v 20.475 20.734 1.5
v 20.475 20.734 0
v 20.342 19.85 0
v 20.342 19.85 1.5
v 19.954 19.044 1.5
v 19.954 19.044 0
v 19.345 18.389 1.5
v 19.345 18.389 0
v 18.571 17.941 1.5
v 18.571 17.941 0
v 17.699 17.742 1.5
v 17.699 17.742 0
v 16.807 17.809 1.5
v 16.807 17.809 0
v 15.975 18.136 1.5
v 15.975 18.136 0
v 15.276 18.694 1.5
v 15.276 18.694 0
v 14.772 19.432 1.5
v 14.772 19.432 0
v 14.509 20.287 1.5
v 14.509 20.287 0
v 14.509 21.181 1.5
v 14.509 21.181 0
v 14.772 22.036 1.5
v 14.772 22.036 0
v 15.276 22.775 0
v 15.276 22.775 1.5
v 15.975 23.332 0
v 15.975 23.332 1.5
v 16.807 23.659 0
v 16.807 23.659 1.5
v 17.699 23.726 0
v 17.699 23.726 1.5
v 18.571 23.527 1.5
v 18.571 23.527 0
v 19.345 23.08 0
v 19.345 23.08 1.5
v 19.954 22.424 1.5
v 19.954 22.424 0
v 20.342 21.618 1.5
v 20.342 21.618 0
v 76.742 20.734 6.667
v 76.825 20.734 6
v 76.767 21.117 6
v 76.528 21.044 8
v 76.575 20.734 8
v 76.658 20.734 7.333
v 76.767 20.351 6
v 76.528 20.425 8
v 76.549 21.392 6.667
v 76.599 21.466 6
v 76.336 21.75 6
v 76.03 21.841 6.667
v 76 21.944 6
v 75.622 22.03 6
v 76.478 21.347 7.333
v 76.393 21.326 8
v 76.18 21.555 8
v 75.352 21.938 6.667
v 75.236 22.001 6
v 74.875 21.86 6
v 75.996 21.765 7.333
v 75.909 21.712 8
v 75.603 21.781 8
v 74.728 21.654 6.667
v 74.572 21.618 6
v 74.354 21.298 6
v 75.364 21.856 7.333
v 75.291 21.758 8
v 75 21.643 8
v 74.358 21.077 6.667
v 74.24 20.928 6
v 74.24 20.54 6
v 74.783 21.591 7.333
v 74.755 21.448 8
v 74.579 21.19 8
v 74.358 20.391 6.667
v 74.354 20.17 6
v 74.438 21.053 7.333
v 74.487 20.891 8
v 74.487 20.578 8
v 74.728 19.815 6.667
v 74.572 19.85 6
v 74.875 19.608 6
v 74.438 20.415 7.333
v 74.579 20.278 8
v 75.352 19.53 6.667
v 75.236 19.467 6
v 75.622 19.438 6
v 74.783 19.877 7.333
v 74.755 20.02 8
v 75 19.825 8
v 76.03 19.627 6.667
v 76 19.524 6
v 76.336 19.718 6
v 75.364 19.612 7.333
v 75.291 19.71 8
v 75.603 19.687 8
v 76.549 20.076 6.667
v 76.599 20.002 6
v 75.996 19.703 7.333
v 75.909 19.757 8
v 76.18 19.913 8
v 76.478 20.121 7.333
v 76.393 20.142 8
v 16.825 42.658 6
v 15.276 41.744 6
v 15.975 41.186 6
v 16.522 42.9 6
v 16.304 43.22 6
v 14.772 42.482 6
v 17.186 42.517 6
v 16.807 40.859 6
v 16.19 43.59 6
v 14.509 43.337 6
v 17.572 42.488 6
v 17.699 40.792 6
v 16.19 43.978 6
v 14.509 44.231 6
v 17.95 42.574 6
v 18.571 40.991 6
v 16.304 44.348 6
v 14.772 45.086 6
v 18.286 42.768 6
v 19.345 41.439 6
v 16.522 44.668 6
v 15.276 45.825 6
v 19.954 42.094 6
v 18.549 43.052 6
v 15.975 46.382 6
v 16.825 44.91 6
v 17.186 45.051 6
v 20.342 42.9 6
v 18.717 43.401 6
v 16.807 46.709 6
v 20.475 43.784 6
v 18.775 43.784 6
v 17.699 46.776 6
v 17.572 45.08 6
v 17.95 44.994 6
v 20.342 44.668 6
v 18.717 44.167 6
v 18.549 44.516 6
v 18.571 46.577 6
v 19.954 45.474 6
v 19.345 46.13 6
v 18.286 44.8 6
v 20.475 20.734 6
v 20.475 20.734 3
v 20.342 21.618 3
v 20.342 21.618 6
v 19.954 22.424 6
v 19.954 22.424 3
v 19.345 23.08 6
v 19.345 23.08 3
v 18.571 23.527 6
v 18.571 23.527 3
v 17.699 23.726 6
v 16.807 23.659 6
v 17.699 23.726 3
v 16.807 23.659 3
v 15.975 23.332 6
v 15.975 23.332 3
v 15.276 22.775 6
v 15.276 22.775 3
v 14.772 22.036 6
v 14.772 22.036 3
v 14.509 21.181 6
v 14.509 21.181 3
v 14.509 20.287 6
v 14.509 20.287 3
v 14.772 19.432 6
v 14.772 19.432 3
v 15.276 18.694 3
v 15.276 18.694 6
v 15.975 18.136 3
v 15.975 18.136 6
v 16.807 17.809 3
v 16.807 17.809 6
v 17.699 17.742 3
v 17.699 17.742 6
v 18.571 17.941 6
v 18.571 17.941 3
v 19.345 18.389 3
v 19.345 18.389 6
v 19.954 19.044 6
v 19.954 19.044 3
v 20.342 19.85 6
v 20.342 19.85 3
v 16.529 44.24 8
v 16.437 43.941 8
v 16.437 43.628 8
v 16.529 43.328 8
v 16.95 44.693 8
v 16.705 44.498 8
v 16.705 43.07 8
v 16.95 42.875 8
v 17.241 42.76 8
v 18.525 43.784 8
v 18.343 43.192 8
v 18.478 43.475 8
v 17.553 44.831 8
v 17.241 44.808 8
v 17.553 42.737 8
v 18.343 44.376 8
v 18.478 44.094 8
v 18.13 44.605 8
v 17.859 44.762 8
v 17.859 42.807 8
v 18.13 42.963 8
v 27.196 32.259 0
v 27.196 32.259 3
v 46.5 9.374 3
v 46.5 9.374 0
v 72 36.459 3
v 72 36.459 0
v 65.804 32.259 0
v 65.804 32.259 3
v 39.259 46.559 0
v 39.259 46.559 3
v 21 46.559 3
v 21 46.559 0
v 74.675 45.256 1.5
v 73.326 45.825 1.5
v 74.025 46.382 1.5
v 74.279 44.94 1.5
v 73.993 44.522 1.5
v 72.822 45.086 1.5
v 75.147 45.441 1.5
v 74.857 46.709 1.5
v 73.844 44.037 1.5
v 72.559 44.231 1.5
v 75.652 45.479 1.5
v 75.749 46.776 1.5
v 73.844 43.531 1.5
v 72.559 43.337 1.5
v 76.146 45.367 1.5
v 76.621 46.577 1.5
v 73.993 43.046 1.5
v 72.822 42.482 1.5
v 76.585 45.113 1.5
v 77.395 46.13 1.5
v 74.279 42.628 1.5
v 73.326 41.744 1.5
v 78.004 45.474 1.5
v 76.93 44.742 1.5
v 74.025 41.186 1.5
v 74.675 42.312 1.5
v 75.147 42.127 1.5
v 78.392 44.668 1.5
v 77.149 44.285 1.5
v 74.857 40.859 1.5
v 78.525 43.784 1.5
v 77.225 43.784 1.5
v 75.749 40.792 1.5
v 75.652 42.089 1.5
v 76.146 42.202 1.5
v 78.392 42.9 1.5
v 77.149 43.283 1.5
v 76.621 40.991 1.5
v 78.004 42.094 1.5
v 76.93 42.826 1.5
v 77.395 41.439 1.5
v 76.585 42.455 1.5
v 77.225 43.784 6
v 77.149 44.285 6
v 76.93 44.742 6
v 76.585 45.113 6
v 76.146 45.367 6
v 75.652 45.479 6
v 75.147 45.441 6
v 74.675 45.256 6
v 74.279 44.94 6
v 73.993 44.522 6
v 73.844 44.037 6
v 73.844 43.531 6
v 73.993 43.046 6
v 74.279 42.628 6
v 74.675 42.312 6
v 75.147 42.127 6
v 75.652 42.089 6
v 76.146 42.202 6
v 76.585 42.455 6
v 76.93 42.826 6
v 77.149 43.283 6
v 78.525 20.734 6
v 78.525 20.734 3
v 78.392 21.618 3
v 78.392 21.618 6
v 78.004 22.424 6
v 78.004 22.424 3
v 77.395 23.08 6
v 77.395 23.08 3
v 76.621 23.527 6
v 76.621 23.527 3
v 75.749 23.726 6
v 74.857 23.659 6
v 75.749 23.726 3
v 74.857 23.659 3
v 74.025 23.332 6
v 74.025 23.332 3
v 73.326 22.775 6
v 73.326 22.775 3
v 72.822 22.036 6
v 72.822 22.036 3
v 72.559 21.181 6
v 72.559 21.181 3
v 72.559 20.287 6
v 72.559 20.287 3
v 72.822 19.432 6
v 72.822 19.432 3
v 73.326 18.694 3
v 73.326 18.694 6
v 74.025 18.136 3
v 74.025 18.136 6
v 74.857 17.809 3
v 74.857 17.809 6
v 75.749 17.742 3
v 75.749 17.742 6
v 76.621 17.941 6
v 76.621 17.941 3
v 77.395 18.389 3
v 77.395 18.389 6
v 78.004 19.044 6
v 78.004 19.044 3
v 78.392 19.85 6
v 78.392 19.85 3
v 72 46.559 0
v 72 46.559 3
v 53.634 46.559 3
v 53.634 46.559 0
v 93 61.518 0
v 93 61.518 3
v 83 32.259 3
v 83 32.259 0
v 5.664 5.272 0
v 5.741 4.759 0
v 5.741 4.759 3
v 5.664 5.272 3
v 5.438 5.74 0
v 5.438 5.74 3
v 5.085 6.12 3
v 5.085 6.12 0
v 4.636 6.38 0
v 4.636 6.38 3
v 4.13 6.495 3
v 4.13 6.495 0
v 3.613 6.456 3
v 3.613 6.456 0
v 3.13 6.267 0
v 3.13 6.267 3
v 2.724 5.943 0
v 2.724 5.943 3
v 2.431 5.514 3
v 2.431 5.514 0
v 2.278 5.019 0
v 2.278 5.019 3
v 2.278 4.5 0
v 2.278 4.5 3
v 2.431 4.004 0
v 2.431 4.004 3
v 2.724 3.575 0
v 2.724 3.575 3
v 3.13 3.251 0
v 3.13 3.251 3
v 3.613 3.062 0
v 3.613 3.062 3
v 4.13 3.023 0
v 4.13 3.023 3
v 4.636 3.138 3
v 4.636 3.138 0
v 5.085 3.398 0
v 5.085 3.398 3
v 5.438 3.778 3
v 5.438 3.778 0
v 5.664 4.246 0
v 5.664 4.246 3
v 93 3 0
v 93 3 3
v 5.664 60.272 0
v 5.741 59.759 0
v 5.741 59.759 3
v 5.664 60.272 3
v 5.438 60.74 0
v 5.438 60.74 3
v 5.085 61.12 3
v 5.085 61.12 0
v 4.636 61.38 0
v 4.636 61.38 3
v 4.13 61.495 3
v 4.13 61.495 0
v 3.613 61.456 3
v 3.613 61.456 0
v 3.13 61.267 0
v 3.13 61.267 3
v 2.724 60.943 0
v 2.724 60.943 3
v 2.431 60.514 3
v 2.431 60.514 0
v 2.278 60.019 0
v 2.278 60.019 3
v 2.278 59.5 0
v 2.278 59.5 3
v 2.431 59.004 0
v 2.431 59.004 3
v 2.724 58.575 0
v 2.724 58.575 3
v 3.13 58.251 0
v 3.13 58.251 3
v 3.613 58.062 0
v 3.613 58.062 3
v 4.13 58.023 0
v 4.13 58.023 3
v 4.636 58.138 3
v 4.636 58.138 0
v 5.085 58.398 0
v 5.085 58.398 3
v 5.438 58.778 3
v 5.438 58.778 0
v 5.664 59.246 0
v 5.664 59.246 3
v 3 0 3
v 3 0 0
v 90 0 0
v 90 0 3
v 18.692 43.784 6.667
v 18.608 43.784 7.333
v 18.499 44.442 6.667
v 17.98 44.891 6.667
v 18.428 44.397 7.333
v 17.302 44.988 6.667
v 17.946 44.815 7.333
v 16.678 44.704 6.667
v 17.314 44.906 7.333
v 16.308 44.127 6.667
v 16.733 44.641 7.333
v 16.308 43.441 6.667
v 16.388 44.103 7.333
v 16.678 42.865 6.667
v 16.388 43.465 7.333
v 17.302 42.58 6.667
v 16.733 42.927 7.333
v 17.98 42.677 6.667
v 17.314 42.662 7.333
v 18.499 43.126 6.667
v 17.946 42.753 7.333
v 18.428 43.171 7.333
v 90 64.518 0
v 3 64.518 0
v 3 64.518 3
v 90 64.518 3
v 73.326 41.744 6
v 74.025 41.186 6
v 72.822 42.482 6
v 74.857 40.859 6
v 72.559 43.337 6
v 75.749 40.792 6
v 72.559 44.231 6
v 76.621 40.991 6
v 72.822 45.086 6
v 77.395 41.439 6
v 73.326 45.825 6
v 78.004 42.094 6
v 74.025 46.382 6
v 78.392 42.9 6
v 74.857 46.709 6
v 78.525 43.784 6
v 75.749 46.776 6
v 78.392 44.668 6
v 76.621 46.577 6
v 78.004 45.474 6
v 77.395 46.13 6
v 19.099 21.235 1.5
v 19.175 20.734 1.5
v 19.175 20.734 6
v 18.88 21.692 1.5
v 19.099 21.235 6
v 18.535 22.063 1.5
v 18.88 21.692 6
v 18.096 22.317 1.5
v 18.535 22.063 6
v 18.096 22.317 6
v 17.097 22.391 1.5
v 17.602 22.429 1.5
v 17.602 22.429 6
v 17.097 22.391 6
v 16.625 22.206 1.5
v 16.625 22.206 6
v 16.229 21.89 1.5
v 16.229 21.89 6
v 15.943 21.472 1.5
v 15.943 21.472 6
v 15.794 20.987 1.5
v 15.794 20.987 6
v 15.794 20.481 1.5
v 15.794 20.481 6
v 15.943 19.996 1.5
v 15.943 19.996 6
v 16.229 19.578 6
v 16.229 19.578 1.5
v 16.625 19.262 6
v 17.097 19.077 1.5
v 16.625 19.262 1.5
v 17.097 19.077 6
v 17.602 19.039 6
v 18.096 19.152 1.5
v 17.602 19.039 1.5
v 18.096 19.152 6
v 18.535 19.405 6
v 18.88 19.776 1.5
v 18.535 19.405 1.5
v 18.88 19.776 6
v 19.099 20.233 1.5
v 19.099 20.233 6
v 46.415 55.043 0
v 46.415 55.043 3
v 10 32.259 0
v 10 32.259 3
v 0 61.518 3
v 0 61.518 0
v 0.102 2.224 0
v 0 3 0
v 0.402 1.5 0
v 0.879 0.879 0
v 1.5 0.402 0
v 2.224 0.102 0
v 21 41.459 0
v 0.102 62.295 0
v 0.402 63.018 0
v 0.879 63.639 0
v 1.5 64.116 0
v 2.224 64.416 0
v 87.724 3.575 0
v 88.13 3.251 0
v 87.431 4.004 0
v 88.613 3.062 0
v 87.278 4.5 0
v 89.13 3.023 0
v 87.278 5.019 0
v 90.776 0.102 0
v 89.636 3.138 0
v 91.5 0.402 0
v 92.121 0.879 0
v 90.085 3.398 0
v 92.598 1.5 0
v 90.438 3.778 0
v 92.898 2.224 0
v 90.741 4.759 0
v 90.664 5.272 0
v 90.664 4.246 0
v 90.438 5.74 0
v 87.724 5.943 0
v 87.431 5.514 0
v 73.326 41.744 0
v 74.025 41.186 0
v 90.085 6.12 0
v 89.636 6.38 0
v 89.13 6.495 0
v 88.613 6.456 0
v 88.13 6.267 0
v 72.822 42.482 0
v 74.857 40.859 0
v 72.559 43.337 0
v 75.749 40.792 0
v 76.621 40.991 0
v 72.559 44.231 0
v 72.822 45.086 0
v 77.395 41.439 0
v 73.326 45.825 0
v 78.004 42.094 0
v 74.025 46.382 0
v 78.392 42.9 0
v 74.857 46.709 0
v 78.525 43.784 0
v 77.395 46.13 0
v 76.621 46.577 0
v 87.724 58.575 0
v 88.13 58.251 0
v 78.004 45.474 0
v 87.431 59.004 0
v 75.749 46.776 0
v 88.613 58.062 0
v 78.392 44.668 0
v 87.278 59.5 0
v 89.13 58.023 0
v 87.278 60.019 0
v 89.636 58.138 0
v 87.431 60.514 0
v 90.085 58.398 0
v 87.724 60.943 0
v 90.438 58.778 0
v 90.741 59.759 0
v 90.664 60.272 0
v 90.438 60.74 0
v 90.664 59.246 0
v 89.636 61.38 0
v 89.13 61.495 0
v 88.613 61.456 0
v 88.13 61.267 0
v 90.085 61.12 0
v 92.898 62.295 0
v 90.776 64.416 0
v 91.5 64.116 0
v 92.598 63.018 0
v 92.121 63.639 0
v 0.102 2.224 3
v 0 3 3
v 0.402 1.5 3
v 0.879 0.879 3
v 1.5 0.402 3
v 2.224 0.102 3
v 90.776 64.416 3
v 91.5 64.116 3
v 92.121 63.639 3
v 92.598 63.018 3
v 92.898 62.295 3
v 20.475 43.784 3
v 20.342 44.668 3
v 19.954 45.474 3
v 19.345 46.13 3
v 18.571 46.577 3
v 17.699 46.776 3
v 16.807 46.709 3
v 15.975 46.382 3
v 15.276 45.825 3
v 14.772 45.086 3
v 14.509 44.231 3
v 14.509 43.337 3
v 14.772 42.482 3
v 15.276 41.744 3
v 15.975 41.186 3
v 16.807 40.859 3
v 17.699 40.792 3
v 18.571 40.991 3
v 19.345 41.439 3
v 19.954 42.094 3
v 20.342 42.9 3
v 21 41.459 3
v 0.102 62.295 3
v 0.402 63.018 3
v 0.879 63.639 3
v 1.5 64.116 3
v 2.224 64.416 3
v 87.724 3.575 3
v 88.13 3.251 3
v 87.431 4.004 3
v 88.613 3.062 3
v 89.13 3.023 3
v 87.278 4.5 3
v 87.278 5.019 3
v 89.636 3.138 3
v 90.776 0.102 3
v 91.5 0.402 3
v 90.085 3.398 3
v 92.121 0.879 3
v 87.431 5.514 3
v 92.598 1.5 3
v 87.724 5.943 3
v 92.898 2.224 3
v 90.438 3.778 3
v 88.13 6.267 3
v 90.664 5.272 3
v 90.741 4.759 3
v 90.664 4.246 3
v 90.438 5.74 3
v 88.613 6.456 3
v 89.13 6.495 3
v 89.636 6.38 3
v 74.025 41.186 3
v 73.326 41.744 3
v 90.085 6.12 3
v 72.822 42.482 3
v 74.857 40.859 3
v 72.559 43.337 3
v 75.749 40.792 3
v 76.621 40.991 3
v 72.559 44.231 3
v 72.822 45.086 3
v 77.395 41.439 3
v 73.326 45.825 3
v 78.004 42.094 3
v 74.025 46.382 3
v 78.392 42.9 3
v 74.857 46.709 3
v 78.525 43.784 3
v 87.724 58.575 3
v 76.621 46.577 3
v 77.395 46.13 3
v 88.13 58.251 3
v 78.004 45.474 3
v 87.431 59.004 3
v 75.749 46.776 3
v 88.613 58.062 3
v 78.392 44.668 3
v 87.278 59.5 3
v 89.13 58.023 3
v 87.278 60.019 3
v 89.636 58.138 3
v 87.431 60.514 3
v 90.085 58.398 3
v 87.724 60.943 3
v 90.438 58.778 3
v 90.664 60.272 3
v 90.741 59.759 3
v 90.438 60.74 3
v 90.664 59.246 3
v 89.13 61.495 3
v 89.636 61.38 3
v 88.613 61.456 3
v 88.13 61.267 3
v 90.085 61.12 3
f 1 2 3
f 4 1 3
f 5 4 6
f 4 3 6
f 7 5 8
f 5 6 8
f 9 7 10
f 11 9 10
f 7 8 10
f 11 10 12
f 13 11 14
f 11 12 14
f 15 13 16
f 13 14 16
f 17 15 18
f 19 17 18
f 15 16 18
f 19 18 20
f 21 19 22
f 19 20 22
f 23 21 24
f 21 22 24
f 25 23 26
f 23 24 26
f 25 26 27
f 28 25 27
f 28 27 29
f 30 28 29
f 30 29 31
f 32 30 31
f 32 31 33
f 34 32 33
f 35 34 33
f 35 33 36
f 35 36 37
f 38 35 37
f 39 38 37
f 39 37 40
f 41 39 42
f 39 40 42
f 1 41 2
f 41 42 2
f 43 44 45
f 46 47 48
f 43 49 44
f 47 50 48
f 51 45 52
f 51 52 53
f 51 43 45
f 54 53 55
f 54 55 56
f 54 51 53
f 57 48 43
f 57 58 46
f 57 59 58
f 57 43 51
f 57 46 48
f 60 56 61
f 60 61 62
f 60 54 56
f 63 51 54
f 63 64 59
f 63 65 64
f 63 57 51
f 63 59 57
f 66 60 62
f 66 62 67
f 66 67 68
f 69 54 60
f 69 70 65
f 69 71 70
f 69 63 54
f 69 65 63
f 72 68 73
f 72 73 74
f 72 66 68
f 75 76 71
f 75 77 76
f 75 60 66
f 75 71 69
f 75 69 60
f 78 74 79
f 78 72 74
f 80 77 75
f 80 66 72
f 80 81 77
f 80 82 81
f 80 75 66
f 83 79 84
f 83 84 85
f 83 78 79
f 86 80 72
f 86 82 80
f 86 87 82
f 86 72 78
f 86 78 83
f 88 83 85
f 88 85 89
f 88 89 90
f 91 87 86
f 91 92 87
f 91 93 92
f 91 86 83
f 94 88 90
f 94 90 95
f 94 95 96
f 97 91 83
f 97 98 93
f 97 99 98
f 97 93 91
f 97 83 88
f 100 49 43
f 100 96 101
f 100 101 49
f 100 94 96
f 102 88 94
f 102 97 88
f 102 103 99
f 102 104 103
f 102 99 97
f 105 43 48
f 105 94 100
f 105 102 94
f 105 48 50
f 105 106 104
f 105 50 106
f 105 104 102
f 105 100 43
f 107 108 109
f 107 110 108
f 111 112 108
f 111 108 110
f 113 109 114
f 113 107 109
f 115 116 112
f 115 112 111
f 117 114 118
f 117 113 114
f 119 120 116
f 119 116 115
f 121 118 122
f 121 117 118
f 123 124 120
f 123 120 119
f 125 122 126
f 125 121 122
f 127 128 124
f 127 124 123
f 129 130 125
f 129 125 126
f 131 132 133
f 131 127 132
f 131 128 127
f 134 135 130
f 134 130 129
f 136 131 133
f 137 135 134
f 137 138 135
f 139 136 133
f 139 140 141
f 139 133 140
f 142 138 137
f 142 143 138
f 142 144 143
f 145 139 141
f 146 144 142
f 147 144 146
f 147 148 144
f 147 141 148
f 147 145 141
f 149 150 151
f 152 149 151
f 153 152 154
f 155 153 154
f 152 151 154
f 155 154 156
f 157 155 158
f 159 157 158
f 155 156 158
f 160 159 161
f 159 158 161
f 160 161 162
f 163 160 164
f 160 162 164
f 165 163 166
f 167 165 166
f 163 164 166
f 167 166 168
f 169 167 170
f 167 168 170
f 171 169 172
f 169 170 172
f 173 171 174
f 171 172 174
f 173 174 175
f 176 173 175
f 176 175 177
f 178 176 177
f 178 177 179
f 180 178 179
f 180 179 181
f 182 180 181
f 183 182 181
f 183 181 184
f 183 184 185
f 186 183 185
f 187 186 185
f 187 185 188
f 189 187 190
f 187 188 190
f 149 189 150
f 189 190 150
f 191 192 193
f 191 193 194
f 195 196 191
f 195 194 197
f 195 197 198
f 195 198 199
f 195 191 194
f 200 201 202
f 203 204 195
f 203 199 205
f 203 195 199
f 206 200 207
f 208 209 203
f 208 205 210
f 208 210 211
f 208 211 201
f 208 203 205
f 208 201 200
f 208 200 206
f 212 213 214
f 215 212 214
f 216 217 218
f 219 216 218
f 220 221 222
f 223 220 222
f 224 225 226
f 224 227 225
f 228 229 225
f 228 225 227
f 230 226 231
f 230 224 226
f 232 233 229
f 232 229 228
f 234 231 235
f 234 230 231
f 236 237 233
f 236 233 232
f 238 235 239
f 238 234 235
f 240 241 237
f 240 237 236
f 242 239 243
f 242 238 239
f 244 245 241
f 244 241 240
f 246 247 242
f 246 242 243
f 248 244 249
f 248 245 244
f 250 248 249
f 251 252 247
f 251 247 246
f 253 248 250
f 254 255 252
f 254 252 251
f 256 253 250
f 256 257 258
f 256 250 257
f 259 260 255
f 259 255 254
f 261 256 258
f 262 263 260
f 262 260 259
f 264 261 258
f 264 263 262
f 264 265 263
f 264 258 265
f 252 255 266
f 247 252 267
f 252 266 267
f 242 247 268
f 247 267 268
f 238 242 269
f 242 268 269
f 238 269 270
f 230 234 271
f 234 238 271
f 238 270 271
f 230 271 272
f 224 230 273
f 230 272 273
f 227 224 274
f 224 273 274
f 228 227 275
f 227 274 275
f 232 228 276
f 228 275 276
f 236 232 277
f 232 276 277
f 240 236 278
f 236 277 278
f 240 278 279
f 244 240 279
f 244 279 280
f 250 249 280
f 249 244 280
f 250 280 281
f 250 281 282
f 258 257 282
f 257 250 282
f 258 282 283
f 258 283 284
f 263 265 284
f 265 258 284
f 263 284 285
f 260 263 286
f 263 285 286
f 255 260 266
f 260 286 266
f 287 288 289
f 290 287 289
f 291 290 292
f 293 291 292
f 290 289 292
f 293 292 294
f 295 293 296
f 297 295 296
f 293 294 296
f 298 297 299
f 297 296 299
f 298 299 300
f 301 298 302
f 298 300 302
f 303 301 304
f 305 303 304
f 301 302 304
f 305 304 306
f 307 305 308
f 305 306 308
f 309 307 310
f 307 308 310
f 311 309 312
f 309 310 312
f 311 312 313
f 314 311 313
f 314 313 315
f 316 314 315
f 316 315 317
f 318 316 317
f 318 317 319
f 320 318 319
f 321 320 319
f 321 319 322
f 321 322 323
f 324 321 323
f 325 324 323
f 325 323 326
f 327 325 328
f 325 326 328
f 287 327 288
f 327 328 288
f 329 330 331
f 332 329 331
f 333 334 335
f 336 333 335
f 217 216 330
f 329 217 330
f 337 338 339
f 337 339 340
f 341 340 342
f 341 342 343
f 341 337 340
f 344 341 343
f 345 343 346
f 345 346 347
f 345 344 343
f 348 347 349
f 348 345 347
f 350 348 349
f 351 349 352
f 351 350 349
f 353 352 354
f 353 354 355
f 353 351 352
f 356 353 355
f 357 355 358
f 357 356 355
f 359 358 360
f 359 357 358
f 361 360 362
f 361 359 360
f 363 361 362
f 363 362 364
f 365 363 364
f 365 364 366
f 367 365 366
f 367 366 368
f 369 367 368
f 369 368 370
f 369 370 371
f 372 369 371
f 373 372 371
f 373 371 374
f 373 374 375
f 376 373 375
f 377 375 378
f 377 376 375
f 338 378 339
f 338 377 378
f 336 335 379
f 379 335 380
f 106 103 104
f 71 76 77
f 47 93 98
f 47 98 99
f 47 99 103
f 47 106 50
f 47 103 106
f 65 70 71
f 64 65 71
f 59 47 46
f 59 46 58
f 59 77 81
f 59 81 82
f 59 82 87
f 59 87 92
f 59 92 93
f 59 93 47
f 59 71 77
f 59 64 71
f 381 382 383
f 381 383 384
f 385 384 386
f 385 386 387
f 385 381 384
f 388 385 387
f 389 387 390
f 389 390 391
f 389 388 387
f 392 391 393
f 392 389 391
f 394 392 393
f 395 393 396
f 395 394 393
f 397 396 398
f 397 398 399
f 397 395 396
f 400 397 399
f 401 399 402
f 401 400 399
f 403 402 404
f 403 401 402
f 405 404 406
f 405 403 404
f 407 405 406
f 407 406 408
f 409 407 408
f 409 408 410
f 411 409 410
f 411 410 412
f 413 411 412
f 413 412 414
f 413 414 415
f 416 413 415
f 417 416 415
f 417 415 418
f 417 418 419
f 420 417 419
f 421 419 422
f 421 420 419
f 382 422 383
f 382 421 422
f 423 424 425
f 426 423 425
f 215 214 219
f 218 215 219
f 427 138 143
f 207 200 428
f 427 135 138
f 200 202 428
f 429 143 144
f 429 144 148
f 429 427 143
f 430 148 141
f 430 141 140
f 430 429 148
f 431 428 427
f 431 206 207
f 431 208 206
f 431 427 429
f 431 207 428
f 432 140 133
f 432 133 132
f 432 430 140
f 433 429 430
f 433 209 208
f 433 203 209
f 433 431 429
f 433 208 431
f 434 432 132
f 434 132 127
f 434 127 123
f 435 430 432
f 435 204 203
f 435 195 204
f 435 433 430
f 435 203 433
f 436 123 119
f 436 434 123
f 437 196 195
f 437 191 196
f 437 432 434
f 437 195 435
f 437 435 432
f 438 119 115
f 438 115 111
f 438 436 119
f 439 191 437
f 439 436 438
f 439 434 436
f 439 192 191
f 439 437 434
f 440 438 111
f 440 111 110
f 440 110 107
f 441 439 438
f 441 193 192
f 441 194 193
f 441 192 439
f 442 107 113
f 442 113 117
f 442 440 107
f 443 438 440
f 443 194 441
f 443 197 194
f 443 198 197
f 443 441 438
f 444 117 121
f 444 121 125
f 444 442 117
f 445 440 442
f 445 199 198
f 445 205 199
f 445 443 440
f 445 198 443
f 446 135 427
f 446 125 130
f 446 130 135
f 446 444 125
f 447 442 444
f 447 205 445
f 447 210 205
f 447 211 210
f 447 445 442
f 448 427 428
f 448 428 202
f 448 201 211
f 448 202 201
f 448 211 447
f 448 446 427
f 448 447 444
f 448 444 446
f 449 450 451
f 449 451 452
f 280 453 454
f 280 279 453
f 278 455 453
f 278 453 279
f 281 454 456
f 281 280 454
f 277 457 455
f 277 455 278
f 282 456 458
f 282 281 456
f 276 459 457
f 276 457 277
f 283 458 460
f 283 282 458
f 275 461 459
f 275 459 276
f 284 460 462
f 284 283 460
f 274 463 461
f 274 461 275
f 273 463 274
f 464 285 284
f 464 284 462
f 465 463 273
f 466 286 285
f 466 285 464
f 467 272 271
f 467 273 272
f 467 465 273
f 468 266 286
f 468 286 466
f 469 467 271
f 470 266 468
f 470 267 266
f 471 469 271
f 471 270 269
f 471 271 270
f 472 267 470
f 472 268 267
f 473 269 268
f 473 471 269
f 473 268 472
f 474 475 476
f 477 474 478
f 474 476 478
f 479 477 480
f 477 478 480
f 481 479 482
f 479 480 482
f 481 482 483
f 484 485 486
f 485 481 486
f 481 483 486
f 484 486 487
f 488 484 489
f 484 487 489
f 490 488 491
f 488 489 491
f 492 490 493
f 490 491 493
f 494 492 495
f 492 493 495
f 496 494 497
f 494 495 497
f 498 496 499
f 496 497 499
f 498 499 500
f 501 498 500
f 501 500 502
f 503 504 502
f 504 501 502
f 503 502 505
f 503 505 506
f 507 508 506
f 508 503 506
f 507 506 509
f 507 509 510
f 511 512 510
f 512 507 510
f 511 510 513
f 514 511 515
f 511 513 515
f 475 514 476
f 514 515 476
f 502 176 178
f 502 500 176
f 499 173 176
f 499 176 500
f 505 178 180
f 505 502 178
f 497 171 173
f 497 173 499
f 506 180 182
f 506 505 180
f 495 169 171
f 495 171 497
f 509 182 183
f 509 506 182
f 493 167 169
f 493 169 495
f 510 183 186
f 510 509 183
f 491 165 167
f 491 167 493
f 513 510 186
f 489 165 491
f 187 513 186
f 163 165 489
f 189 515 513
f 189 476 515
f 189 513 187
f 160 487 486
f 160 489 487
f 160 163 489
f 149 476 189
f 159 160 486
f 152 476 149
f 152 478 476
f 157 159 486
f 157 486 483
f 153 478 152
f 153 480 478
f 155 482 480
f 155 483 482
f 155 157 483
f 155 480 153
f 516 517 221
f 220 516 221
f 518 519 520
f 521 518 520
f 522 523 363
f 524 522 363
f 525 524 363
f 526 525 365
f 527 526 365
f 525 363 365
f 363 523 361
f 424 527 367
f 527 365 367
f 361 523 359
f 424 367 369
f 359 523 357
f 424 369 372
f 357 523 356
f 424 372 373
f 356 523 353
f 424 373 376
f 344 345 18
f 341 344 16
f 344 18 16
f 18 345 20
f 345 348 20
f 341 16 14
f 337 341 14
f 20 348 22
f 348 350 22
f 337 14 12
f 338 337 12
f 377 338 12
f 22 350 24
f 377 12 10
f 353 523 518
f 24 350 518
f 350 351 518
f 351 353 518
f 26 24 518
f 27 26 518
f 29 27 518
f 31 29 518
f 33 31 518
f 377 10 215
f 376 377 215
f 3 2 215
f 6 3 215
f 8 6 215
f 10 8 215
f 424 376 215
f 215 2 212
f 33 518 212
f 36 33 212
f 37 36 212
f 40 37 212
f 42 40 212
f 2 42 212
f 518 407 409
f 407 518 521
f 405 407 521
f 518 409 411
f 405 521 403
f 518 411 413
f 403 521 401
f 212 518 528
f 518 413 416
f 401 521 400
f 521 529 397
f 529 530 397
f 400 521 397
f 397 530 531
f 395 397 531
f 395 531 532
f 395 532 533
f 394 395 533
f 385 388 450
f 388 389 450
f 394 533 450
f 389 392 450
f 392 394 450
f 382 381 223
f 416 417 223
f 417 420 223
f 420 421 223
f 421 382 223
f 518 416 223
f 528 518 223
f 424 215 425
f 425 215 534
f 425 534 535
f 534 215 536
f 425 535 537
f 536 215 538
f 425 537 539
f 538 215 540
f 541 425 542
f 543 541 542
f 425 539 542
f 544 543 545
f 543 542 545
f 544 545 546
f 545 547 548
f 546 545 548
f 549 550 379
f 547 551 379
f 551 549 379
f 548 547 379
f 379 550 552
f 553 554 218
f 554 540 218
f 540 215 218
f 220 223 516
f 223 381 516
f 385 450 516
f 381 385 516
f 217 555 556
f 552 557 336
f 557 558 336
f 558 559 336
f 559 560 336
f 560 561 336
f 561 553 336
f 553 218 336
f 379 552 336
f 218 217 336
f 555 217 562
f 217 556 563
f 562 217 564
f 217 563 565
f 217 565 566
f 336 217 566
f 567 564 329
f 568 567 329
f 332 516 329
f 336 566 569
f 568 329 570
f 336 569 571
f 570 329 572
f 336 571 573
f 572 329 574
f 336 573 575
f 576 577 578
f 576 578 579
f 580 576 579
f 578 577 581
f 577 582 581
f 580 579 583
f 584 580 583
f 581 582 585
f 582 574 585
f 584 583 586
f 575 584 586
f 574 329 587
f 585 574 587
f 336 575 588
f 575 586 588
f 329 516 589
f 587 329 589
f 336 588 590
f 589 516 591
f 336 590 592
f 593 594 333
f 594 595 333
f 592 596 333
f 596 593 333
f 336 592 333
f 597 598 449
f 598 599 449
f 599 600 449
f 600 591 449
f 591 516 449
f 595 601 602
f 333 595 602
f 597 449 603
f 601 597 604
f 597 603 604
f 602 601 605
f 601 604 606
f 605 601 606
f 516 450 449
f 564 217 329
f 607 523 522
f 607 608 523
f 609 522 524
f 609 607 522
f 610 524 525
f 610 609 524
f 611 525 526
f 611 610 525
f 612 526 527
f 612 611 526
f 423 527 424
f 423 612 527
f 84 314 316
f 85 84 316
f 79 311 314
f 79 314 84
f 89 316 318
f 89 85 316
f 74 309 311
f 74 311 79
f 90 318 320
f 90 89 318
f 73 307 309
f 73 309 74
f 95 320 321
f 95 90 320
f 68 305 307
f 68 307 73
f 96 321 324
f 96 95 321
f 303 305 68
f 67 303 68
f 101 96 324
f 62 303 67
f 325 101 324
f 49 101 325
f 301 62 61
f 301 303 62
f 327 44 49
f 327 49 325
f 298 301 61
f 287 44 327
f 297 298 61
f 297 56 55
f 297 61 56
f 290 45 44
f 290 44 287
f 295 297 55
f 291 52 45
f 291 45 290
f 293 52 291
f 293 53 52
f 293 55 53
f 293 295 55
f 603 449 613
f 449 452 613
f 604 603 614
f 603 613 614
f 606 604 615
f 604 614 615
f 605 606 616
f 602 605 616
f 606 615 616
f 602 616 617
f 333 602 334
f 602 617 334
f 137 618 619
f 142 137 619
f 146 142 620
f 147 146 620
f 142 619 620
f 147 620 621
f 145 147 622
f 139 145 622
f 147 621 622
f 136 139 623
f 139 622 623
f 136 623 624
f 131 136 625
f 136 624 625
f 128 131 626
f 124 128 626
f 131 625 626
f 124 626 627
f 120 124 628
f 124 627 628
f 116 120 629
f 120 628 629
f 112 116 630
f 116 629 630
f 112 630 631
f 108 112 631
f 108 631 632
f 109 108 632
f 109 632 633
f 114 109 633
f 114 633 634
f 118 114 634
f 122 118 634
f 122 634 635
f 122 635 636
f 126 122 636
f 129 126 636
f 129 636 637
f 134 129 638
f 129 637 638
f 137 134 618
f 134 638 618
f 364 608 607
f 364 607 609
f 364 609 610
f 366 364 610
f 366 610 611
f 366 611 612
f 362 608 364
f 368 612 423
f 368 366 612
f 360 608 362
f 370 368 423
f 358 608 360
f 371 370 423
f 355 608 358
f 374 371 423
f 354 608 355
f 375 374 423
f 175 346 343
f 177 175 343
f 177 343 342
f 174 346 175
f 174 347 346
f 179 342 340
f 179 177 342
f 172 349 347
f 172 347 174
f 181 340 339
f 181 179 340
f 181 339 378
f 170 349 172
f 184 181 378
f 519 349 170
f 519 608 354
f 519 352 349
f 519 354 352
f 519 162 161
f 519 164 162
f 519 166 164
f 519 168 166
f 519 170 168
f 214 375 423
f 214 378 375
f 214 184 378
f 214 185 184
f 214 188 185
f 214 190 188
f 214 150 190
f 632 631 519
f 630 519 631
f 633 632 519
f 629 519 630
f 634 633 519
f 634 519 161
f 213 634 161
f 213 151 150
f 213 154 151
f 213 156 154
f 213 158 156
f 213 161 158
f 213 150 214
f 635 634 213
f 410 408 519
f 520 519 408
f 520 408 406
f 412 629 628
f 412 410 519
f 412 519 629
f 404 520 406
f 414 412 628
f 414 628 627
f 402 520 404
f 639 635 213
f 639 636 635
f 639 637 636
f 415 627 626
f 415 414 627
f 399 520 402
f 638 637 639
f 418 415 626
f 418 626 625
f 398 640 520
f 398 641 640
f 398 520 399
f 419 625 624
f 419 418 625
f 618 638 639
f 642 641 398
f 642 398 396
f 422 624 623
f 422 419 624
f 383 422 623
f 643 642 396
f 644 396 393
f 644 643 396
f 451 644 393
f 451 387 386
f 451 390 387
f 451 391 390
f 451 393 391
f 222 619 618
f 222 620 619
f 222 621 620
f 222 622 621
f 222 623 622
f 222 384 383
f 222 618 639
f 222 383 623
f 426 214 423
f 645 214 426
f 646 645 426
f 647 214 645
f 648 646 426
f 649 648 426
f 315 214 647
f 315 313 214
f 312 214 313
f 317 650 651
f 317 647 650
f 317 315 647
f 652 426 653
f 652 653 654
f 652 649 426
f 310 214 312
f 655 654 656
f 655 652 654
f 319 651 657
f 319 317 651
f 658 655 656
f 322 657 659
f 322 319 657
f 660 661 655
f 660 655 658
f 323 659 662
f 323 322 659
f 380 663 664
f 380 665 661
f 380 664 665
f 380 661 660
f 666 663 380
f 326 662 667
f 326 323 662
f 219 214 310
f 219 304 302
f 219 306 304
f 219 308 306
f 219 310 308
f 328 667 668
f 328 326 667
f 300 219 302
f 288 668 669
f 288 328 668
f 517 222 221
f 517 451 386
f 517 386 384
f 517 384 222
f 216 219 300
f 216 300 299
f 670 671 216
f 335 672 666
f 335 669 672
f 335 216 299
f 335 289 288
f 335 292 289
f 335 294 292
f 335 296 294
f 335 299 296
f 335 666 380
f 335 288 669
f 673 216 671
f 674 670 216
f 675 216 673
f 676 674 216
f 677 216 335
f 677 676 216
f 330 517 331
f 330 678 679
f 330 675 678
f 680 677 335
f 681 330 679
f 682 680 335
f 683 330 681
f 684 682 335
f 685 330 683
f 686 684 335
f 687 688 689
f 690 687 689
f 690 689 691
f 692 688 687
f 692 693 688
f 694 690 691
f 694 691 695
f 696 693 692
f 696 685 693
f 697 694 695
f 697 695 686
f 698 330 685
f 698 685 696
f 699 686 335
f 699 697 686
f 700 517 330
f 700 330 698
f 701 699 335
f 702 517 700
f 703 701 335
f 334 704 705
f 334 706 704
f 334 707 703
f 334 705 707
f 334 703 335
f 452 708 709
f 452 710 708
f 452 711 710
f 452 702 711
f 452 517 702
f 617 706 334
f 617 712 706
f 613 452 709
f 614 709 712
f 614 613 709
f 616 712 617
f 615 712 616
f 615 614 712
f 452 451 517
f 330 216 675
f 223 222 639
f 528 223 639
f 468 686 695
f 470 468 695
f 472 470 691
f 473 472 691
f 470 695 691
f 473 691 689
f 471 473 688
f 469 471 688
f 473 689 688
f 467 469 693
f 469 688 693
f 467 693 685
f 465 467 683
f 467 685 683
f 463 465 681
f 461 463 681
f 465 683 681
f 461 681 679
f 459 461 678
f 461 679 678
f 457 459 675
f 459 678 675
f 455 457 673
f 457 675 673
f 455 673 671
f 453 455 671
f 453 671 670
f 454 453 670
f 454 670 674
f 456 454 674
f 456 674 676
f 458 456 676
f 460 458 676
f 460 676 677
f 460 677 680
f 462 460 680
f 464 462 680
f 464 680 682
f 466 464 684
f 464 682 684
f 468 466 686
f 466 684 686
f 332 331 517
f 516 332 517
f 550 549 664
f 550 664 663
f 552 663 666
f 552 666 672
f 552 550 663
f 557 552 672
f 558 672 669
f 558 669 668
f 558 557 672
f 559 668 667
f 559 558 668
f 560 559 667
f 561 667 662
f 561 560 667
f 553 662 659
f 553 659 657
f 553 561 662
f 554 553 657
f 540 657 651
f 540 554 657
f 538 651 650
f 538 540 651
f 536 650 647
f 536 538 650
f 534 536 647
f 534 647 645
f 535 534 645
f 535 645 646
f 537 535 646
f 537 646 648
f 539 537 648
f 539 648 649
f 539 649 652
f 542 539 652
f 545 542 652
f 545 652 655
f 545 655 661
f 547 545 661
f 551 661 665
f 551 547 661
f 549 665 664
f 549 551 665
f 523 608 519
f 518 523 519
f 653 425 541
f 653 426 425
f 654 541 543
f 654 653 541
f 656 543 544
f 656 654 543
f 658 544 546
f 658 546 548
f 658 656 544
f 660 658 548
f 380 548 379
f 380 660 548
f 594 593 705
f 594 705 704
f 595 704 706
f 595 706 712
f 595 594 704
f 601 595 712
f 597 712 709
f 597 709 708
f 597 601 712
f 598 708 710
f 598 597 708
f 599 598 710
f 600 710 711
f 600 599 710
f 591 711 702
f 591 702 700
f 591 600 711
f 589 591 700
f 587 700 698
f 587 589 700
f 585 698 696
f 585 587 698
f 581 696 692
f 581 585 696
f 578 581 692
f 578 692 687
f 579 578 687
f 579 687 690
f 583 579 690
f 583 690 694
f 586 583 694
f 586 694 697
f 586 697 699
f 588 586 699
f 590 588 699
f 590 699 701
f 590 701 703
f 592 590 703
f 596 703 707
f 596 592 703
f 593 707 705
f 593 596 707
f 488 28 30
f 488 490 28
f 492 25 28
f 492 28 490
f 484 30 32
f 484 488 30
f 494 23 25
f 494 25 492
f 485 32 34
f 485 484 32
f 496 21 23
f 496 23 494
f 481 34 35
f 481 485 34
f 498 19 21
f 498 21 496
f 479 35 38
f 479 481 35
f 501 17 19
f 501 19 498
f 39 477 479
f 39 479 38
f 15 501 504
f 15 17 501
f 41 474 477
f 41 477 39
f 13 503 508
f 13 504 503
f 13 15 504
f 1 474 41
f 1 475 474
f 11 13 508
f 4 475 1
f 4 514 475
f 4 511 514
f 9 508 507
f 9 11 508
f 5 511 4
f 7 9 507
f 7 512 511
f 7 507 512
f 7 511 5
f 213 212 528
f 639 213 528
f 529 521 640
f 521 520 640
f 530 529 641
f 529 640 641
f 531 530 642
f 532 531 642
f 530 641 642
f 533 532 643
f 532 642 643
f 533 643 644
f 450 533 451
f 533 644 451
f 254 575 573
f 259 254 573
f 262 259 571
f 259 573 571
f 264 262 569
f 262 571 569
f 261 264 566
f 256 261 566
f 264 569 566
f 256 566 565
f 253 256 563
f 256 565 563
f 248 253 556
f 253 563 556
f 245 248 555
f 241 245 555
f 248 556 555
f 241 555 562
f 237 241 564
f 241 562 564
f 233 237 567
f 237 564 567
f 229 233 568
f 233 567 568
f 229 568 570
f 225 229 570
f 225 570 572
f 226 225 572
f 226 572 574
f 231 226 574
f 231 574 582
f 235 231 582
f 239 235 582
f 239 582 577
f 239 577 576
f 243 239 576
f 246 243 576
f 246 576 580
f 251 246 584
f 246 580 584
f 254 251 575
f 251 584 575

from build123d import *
from OCP.BRepFilletAPI import BRepFilletAPI_MakeChamfer

# Parameters (mm, degrees)
SKETCH2_W           = 93
SKETCH2_H           = 64.518072289
SKETCH2_R           = 1.740963855
BOSS_EXTRUDE1_DEPTH = 3
FILLET1_R           = 3
SKETCH3_R           = 3
SKETCH3_R_2         = 1.325
BOSS_EXTRUDE2_DEPTH = 3
SKETCH4_R           = 1.3
BOSS_EXTRUDE3_DEPTH = 2
SKETCH5_R           = 1.7
CUT_EXTRUDE1_DEPTH  = 11
CHAMFER1_SIZE       = 2
CHAMFER1_SIZE_2     = 0.25
CUT_EXTRUDE2_DEPTH  = 11
CUT_EXTRUDE3_DEPTH  = 11
SKETCH8_R           = 3
SKETCH8_R_2         = 1.7
CUT_EXTRUDE4_DEPTH  = 1.5
CUT_EXTRUDE5_DEPTH  = 1.5
CUT_EXTRUDE6_DEPTH  = 3


with BuildPart() as part:
    # Sketch2 → Boss-Extrude1 (new body)
    with BuildSketch(Plane.XY):
        with Locations((46.5, 32.259036145)):
            Rectangle(SKETCH2_W, SKETCH2_H)
        with Locations((89, 4.759036145)):
            Circle(SKETCH2_R, mode=Mode.SUBTRACT)
        with Locations((89, 59.759036145)):
            Circle(SKETCH2_R, mode=Mode.SUBTRACT)
        with Locations((4, 59.759036145)):
            Circle(SKETCH2_R, mode=Mode.SUBTRACT)
        with Locations((4, 4.759036145)):
            Circle(SKETCH2_R, mode=Mode.SUBTRACT)
    extrude(amount=BOSS_EXTRUDE1_DEPTH)

    # Fillet1
    fillet1_edges = [part.edges().sort_by_distance(p)[0] for p in [
        (0, 0, 1.5),
        (0, 64.518072289, 1.5),
        (93, 64.518072289, 1.5),
        (93, 0, 1.5),
    ]]
    fillet(fillet1_edges, radius=FILLET1_R)

    # Sketch3 → Boss-Extrude2 (add)
    # profile 1 of 8: a face of its own
    with BuildSketch(Plane.XY.offset(3)):
        with Locations((17.475, 43.784036145)):
            Circle(SKETCH3_R)
        with Locations((17.475, 43.784036145)):
            Circle(SKETCH3_R_2, mode=Mode.SUBTRACT)
    # profile 2 of 8: a face of its own
    with BuildSketch(Plane.XY.offset(3)):
        with Locations((17.475, 20.734036145)):
            Circle(SKETCH3_R)
        with Locations((17.475, 20.734036145)):
            Circle(SKETCH3_R_2, mode=Mode.SUBTRACT)
    # profile 3 of 8: a face of its own
    with BuildSketch(Plane.XY.offset(3)):
        with Locations((17.475, 20.734036145)):
            Circle(SKETCH3_R_2)
    # profile 4 of 8: a face of its own
    with BuildSketch(Plane.XY.offset(3)):
        with Locations((75.525, 43.784036145)):
            Circle(SKETCH3_R)
        with Locations((75.525, 43.784036145)):
            Circle(SKETCH3_R_2, mode=Mode.SUBTRACT)
    # profile 5 of 8: a face of its own
    with BuildSketch(Plane.XY.offset(3)):
        with Locations((75.525, 43.784036145)):
            Circle(SKETCH3_R_2)
    # profile 6 of 8: a face of its own
    with BuildSketch(Plane.XY.offset(3)):
        with Locations((75.525, 20.734036145)):
            Circle(SKETCH3_R)
        with Locations((75.525, 20.734036145)):
            Circle(SKETCH3_R_2, mode=Mode.SUBTRACT)
    # profile 7 of 8: a face of its own
    with BuildSketch(Plane.XY.offset(3)):
        with Locations((75.525, 20.734036145)):
            Circle(SKETCH3_R_2)
    # profile 8 of 8: a face of its own
    with BuildSketch(Plane.XY.offset(3)):
        with Locations((17.475, 43.784036145)):
            Circle(SKETCH3_R_2)
    extrude(amount=BOSS_EXTRUDE2_DEPTH)

    # Sketch4 → Boss-Extrude3 (add)
    with BuildSketch(Plane.XY.offset(6)):
        with Locations((75.525, 20.734036145)):
            Circle(SKETCH4_R)
        with Locations((17.475, 43.784036145)):
            Circle(SKETCH4_R)
    extrude(amount=BOSS_EXTRUDE3_DEPTH)

    # Sketch5 → Cut-Extrude1 (cut)
    with BuildSketch(Plane.XY.offset(6)):
        with Locations((17.475, 20.734036145)):
            Circle(SKETCH5_R)
        with Locations((75.525, 43.784036145)):
            Circle(SKETCH5_R)
    extrude(amount=-CUT_EXTRUDE1_DEPTH, mode=Mode.SUBTRACT)

    # Chamfer1
    chamfer1_edges_1 = [part.edges().sort_by_distance(p)[0] for p in [
        (74.225, 20.734036145, 8),
    ]]
    chamfer1_side_1 = [part.faces().sort_by_distance(p)[0] for p in [
        (74.225, 20.734036145, 7.995),
    ]]
    chamfer1_edges_2 = [part.edges().sort_by_distance(p)[0] for p in [
        (16.175, 43.784036145, 8),
    ]]
    chamfer1_side_2 = [part.faces().sort_by_distance(p)[0] for p in [
        (16.175, 43.784036145, 7.995),
    ]]
    chamfer1 = BRepFilletAPI_MakeChamfer(part.part.solid().wrapped)
    for e in chamfer1_edges_1:
        chamfer1.Add(CHAMFER1_SIZE - 0.0001, CHAMFER1_SIZE_2 - 0.0001, e.wrapped, chamfer1_side_1[0].wrapped)
    for e in chamfer1_edges_2:
        chamfer1.Add(CHAMFER1_SIZE - 0.0001, CHAMFER1_SIZE_2 - 0.0001, e.wrapped, chamfer1_side_2[0].wrapped)
    add(Compound.cast(chamfer1.Shape()), mode=Mode.REPLACE)  # a hair under: the kernel refuses the full size

    # Sketch6 → Cut-Extrude2 (cut)
    with BuildSketch(Plane.XY.offset(3)):
        Polygon((46.41475966, 55.04295344), (27.196400626, 32.259036144), (46.5, 9.374063974), (65.803599374, 32.259036145), align=None)
    extrude(amount=-CUT_EXTRUDE2_DEPTH, mode=Mode.SUBTRACT)

    # Sketch7 → Cut-Extrude3 (cut)
    with BuildSketch(Plane.XY.offset(3)):
        Polygon((21, 46.559036145), (21, 41.459036145), (66.9, 41.459036145), (66.9, 36.459036145), (72, 36.459036145), (72, 46.559036145), align=None)
    extrude(amount=-CUT_EXTRUDE3_DEPTH, mode=Mode.SUBTRACT)

    # Sketch8 → Cut-Extrude4 (cut)
    # profile 1 of 4: a face of its own
    with BuildSketch(Plane(origin=(0, 0, 0), x_dir=(-1, 0, 0), z_dir=(0, 0, -1))):
        with Locations(Location((-75.525, 43.784036145, 0), (0, 0, 180))):
            Circle(SKETCH8_R)
        with Locations(Location((-75.525, 43.784036145, 0), (0, 0, 180))):
            Circle(SKETCH8_R_2, mode=Mode.SUBTRACT)
    # profile 2 of 4: a face of its own
    with BuildSketch(Plane(origin=(0, 0, 0), x_dir=(-1, 0, 0), z_dir=(0, 0, -1))):
        with Locations(Location((-17.475, 20.734036145, 0), (0, 0, 180))):
            Circle(SKETCH8_R)
        with Locations(Location((-17.475, 20.734036145, 0), (0, 0, 180))):
            Circle(SKETCH8_R_2, mode=Mode.SUBTRACT)
    # profile 3 of 4: a face of its own
    with BuildSketch(Plane(origin=(0, 0, 0), x_dir=(-1, 0, 0), z_dir=(0, 0, -1))):
        Polygon((-72, 36.459036145), (-65.803599374, 32.259036145), (-57.974509975, 41.459036145), (-66.9, 41.459036145), align=None)
    # profile 4 of 4: a face of its own
    with BuildSketch(Plane(origin=(0, 0, 0), x_dir=(-1, 0, 0), z_dir=(0, 0, -1))):
        Polygon((-27.196400626, 32.259036144), (-21, 41.459036145), (-34.956651017, 41.459036145), align=None)
    extrude(amount=-CUT_EXTRUDE4_DEPTH, mode=Mode.SUBTRACT)

    # Sketch9 → Cut-Extrude5 (cut)
    with BuildSketch(Plane(origin=(0, 0, 1.5), x_dir=(-1, 0, 0), z_dir=(0, 0, -1))):
        Polygon((-66.9, 36.459036145), (-72, 36.459036145), (-65.803599374, 32.259036145), (-57.974509975, 41.459036145), (-66.9, 41.459036145), align=None)
        Polygon((-34.956651017, 41.459036145), (-27.196400626, 32.259036144), (-21, 41.459036145), align=None)
    extrude(amount=-CUT_EXTRUDE5_DEPTH, mode=Mode.SUBTRACT)

    # Sketch10 → Cut-Extrude6 (cut)
    with BuildSketch(Plane.XY.offset(3)):
        Polygon((0, 61.518072289), (0, 32.259036145), (10, 32.259036145), align=None)
        Polygon((10, 32.259036145), (0, 32.259036145), (0, 3), align=None)
        Polygon((93, 32.259036145), (93, 61.518072289), (83, 32.259036145), align=None)
        Polygon((83, 32.259036145), (93, 3), (93, 32.259036145), align=None)
    extrude(amount=-CUT_EXTRUDE6_DEPTH, mode=Mode.SUBTRACT)


solid = part.part
